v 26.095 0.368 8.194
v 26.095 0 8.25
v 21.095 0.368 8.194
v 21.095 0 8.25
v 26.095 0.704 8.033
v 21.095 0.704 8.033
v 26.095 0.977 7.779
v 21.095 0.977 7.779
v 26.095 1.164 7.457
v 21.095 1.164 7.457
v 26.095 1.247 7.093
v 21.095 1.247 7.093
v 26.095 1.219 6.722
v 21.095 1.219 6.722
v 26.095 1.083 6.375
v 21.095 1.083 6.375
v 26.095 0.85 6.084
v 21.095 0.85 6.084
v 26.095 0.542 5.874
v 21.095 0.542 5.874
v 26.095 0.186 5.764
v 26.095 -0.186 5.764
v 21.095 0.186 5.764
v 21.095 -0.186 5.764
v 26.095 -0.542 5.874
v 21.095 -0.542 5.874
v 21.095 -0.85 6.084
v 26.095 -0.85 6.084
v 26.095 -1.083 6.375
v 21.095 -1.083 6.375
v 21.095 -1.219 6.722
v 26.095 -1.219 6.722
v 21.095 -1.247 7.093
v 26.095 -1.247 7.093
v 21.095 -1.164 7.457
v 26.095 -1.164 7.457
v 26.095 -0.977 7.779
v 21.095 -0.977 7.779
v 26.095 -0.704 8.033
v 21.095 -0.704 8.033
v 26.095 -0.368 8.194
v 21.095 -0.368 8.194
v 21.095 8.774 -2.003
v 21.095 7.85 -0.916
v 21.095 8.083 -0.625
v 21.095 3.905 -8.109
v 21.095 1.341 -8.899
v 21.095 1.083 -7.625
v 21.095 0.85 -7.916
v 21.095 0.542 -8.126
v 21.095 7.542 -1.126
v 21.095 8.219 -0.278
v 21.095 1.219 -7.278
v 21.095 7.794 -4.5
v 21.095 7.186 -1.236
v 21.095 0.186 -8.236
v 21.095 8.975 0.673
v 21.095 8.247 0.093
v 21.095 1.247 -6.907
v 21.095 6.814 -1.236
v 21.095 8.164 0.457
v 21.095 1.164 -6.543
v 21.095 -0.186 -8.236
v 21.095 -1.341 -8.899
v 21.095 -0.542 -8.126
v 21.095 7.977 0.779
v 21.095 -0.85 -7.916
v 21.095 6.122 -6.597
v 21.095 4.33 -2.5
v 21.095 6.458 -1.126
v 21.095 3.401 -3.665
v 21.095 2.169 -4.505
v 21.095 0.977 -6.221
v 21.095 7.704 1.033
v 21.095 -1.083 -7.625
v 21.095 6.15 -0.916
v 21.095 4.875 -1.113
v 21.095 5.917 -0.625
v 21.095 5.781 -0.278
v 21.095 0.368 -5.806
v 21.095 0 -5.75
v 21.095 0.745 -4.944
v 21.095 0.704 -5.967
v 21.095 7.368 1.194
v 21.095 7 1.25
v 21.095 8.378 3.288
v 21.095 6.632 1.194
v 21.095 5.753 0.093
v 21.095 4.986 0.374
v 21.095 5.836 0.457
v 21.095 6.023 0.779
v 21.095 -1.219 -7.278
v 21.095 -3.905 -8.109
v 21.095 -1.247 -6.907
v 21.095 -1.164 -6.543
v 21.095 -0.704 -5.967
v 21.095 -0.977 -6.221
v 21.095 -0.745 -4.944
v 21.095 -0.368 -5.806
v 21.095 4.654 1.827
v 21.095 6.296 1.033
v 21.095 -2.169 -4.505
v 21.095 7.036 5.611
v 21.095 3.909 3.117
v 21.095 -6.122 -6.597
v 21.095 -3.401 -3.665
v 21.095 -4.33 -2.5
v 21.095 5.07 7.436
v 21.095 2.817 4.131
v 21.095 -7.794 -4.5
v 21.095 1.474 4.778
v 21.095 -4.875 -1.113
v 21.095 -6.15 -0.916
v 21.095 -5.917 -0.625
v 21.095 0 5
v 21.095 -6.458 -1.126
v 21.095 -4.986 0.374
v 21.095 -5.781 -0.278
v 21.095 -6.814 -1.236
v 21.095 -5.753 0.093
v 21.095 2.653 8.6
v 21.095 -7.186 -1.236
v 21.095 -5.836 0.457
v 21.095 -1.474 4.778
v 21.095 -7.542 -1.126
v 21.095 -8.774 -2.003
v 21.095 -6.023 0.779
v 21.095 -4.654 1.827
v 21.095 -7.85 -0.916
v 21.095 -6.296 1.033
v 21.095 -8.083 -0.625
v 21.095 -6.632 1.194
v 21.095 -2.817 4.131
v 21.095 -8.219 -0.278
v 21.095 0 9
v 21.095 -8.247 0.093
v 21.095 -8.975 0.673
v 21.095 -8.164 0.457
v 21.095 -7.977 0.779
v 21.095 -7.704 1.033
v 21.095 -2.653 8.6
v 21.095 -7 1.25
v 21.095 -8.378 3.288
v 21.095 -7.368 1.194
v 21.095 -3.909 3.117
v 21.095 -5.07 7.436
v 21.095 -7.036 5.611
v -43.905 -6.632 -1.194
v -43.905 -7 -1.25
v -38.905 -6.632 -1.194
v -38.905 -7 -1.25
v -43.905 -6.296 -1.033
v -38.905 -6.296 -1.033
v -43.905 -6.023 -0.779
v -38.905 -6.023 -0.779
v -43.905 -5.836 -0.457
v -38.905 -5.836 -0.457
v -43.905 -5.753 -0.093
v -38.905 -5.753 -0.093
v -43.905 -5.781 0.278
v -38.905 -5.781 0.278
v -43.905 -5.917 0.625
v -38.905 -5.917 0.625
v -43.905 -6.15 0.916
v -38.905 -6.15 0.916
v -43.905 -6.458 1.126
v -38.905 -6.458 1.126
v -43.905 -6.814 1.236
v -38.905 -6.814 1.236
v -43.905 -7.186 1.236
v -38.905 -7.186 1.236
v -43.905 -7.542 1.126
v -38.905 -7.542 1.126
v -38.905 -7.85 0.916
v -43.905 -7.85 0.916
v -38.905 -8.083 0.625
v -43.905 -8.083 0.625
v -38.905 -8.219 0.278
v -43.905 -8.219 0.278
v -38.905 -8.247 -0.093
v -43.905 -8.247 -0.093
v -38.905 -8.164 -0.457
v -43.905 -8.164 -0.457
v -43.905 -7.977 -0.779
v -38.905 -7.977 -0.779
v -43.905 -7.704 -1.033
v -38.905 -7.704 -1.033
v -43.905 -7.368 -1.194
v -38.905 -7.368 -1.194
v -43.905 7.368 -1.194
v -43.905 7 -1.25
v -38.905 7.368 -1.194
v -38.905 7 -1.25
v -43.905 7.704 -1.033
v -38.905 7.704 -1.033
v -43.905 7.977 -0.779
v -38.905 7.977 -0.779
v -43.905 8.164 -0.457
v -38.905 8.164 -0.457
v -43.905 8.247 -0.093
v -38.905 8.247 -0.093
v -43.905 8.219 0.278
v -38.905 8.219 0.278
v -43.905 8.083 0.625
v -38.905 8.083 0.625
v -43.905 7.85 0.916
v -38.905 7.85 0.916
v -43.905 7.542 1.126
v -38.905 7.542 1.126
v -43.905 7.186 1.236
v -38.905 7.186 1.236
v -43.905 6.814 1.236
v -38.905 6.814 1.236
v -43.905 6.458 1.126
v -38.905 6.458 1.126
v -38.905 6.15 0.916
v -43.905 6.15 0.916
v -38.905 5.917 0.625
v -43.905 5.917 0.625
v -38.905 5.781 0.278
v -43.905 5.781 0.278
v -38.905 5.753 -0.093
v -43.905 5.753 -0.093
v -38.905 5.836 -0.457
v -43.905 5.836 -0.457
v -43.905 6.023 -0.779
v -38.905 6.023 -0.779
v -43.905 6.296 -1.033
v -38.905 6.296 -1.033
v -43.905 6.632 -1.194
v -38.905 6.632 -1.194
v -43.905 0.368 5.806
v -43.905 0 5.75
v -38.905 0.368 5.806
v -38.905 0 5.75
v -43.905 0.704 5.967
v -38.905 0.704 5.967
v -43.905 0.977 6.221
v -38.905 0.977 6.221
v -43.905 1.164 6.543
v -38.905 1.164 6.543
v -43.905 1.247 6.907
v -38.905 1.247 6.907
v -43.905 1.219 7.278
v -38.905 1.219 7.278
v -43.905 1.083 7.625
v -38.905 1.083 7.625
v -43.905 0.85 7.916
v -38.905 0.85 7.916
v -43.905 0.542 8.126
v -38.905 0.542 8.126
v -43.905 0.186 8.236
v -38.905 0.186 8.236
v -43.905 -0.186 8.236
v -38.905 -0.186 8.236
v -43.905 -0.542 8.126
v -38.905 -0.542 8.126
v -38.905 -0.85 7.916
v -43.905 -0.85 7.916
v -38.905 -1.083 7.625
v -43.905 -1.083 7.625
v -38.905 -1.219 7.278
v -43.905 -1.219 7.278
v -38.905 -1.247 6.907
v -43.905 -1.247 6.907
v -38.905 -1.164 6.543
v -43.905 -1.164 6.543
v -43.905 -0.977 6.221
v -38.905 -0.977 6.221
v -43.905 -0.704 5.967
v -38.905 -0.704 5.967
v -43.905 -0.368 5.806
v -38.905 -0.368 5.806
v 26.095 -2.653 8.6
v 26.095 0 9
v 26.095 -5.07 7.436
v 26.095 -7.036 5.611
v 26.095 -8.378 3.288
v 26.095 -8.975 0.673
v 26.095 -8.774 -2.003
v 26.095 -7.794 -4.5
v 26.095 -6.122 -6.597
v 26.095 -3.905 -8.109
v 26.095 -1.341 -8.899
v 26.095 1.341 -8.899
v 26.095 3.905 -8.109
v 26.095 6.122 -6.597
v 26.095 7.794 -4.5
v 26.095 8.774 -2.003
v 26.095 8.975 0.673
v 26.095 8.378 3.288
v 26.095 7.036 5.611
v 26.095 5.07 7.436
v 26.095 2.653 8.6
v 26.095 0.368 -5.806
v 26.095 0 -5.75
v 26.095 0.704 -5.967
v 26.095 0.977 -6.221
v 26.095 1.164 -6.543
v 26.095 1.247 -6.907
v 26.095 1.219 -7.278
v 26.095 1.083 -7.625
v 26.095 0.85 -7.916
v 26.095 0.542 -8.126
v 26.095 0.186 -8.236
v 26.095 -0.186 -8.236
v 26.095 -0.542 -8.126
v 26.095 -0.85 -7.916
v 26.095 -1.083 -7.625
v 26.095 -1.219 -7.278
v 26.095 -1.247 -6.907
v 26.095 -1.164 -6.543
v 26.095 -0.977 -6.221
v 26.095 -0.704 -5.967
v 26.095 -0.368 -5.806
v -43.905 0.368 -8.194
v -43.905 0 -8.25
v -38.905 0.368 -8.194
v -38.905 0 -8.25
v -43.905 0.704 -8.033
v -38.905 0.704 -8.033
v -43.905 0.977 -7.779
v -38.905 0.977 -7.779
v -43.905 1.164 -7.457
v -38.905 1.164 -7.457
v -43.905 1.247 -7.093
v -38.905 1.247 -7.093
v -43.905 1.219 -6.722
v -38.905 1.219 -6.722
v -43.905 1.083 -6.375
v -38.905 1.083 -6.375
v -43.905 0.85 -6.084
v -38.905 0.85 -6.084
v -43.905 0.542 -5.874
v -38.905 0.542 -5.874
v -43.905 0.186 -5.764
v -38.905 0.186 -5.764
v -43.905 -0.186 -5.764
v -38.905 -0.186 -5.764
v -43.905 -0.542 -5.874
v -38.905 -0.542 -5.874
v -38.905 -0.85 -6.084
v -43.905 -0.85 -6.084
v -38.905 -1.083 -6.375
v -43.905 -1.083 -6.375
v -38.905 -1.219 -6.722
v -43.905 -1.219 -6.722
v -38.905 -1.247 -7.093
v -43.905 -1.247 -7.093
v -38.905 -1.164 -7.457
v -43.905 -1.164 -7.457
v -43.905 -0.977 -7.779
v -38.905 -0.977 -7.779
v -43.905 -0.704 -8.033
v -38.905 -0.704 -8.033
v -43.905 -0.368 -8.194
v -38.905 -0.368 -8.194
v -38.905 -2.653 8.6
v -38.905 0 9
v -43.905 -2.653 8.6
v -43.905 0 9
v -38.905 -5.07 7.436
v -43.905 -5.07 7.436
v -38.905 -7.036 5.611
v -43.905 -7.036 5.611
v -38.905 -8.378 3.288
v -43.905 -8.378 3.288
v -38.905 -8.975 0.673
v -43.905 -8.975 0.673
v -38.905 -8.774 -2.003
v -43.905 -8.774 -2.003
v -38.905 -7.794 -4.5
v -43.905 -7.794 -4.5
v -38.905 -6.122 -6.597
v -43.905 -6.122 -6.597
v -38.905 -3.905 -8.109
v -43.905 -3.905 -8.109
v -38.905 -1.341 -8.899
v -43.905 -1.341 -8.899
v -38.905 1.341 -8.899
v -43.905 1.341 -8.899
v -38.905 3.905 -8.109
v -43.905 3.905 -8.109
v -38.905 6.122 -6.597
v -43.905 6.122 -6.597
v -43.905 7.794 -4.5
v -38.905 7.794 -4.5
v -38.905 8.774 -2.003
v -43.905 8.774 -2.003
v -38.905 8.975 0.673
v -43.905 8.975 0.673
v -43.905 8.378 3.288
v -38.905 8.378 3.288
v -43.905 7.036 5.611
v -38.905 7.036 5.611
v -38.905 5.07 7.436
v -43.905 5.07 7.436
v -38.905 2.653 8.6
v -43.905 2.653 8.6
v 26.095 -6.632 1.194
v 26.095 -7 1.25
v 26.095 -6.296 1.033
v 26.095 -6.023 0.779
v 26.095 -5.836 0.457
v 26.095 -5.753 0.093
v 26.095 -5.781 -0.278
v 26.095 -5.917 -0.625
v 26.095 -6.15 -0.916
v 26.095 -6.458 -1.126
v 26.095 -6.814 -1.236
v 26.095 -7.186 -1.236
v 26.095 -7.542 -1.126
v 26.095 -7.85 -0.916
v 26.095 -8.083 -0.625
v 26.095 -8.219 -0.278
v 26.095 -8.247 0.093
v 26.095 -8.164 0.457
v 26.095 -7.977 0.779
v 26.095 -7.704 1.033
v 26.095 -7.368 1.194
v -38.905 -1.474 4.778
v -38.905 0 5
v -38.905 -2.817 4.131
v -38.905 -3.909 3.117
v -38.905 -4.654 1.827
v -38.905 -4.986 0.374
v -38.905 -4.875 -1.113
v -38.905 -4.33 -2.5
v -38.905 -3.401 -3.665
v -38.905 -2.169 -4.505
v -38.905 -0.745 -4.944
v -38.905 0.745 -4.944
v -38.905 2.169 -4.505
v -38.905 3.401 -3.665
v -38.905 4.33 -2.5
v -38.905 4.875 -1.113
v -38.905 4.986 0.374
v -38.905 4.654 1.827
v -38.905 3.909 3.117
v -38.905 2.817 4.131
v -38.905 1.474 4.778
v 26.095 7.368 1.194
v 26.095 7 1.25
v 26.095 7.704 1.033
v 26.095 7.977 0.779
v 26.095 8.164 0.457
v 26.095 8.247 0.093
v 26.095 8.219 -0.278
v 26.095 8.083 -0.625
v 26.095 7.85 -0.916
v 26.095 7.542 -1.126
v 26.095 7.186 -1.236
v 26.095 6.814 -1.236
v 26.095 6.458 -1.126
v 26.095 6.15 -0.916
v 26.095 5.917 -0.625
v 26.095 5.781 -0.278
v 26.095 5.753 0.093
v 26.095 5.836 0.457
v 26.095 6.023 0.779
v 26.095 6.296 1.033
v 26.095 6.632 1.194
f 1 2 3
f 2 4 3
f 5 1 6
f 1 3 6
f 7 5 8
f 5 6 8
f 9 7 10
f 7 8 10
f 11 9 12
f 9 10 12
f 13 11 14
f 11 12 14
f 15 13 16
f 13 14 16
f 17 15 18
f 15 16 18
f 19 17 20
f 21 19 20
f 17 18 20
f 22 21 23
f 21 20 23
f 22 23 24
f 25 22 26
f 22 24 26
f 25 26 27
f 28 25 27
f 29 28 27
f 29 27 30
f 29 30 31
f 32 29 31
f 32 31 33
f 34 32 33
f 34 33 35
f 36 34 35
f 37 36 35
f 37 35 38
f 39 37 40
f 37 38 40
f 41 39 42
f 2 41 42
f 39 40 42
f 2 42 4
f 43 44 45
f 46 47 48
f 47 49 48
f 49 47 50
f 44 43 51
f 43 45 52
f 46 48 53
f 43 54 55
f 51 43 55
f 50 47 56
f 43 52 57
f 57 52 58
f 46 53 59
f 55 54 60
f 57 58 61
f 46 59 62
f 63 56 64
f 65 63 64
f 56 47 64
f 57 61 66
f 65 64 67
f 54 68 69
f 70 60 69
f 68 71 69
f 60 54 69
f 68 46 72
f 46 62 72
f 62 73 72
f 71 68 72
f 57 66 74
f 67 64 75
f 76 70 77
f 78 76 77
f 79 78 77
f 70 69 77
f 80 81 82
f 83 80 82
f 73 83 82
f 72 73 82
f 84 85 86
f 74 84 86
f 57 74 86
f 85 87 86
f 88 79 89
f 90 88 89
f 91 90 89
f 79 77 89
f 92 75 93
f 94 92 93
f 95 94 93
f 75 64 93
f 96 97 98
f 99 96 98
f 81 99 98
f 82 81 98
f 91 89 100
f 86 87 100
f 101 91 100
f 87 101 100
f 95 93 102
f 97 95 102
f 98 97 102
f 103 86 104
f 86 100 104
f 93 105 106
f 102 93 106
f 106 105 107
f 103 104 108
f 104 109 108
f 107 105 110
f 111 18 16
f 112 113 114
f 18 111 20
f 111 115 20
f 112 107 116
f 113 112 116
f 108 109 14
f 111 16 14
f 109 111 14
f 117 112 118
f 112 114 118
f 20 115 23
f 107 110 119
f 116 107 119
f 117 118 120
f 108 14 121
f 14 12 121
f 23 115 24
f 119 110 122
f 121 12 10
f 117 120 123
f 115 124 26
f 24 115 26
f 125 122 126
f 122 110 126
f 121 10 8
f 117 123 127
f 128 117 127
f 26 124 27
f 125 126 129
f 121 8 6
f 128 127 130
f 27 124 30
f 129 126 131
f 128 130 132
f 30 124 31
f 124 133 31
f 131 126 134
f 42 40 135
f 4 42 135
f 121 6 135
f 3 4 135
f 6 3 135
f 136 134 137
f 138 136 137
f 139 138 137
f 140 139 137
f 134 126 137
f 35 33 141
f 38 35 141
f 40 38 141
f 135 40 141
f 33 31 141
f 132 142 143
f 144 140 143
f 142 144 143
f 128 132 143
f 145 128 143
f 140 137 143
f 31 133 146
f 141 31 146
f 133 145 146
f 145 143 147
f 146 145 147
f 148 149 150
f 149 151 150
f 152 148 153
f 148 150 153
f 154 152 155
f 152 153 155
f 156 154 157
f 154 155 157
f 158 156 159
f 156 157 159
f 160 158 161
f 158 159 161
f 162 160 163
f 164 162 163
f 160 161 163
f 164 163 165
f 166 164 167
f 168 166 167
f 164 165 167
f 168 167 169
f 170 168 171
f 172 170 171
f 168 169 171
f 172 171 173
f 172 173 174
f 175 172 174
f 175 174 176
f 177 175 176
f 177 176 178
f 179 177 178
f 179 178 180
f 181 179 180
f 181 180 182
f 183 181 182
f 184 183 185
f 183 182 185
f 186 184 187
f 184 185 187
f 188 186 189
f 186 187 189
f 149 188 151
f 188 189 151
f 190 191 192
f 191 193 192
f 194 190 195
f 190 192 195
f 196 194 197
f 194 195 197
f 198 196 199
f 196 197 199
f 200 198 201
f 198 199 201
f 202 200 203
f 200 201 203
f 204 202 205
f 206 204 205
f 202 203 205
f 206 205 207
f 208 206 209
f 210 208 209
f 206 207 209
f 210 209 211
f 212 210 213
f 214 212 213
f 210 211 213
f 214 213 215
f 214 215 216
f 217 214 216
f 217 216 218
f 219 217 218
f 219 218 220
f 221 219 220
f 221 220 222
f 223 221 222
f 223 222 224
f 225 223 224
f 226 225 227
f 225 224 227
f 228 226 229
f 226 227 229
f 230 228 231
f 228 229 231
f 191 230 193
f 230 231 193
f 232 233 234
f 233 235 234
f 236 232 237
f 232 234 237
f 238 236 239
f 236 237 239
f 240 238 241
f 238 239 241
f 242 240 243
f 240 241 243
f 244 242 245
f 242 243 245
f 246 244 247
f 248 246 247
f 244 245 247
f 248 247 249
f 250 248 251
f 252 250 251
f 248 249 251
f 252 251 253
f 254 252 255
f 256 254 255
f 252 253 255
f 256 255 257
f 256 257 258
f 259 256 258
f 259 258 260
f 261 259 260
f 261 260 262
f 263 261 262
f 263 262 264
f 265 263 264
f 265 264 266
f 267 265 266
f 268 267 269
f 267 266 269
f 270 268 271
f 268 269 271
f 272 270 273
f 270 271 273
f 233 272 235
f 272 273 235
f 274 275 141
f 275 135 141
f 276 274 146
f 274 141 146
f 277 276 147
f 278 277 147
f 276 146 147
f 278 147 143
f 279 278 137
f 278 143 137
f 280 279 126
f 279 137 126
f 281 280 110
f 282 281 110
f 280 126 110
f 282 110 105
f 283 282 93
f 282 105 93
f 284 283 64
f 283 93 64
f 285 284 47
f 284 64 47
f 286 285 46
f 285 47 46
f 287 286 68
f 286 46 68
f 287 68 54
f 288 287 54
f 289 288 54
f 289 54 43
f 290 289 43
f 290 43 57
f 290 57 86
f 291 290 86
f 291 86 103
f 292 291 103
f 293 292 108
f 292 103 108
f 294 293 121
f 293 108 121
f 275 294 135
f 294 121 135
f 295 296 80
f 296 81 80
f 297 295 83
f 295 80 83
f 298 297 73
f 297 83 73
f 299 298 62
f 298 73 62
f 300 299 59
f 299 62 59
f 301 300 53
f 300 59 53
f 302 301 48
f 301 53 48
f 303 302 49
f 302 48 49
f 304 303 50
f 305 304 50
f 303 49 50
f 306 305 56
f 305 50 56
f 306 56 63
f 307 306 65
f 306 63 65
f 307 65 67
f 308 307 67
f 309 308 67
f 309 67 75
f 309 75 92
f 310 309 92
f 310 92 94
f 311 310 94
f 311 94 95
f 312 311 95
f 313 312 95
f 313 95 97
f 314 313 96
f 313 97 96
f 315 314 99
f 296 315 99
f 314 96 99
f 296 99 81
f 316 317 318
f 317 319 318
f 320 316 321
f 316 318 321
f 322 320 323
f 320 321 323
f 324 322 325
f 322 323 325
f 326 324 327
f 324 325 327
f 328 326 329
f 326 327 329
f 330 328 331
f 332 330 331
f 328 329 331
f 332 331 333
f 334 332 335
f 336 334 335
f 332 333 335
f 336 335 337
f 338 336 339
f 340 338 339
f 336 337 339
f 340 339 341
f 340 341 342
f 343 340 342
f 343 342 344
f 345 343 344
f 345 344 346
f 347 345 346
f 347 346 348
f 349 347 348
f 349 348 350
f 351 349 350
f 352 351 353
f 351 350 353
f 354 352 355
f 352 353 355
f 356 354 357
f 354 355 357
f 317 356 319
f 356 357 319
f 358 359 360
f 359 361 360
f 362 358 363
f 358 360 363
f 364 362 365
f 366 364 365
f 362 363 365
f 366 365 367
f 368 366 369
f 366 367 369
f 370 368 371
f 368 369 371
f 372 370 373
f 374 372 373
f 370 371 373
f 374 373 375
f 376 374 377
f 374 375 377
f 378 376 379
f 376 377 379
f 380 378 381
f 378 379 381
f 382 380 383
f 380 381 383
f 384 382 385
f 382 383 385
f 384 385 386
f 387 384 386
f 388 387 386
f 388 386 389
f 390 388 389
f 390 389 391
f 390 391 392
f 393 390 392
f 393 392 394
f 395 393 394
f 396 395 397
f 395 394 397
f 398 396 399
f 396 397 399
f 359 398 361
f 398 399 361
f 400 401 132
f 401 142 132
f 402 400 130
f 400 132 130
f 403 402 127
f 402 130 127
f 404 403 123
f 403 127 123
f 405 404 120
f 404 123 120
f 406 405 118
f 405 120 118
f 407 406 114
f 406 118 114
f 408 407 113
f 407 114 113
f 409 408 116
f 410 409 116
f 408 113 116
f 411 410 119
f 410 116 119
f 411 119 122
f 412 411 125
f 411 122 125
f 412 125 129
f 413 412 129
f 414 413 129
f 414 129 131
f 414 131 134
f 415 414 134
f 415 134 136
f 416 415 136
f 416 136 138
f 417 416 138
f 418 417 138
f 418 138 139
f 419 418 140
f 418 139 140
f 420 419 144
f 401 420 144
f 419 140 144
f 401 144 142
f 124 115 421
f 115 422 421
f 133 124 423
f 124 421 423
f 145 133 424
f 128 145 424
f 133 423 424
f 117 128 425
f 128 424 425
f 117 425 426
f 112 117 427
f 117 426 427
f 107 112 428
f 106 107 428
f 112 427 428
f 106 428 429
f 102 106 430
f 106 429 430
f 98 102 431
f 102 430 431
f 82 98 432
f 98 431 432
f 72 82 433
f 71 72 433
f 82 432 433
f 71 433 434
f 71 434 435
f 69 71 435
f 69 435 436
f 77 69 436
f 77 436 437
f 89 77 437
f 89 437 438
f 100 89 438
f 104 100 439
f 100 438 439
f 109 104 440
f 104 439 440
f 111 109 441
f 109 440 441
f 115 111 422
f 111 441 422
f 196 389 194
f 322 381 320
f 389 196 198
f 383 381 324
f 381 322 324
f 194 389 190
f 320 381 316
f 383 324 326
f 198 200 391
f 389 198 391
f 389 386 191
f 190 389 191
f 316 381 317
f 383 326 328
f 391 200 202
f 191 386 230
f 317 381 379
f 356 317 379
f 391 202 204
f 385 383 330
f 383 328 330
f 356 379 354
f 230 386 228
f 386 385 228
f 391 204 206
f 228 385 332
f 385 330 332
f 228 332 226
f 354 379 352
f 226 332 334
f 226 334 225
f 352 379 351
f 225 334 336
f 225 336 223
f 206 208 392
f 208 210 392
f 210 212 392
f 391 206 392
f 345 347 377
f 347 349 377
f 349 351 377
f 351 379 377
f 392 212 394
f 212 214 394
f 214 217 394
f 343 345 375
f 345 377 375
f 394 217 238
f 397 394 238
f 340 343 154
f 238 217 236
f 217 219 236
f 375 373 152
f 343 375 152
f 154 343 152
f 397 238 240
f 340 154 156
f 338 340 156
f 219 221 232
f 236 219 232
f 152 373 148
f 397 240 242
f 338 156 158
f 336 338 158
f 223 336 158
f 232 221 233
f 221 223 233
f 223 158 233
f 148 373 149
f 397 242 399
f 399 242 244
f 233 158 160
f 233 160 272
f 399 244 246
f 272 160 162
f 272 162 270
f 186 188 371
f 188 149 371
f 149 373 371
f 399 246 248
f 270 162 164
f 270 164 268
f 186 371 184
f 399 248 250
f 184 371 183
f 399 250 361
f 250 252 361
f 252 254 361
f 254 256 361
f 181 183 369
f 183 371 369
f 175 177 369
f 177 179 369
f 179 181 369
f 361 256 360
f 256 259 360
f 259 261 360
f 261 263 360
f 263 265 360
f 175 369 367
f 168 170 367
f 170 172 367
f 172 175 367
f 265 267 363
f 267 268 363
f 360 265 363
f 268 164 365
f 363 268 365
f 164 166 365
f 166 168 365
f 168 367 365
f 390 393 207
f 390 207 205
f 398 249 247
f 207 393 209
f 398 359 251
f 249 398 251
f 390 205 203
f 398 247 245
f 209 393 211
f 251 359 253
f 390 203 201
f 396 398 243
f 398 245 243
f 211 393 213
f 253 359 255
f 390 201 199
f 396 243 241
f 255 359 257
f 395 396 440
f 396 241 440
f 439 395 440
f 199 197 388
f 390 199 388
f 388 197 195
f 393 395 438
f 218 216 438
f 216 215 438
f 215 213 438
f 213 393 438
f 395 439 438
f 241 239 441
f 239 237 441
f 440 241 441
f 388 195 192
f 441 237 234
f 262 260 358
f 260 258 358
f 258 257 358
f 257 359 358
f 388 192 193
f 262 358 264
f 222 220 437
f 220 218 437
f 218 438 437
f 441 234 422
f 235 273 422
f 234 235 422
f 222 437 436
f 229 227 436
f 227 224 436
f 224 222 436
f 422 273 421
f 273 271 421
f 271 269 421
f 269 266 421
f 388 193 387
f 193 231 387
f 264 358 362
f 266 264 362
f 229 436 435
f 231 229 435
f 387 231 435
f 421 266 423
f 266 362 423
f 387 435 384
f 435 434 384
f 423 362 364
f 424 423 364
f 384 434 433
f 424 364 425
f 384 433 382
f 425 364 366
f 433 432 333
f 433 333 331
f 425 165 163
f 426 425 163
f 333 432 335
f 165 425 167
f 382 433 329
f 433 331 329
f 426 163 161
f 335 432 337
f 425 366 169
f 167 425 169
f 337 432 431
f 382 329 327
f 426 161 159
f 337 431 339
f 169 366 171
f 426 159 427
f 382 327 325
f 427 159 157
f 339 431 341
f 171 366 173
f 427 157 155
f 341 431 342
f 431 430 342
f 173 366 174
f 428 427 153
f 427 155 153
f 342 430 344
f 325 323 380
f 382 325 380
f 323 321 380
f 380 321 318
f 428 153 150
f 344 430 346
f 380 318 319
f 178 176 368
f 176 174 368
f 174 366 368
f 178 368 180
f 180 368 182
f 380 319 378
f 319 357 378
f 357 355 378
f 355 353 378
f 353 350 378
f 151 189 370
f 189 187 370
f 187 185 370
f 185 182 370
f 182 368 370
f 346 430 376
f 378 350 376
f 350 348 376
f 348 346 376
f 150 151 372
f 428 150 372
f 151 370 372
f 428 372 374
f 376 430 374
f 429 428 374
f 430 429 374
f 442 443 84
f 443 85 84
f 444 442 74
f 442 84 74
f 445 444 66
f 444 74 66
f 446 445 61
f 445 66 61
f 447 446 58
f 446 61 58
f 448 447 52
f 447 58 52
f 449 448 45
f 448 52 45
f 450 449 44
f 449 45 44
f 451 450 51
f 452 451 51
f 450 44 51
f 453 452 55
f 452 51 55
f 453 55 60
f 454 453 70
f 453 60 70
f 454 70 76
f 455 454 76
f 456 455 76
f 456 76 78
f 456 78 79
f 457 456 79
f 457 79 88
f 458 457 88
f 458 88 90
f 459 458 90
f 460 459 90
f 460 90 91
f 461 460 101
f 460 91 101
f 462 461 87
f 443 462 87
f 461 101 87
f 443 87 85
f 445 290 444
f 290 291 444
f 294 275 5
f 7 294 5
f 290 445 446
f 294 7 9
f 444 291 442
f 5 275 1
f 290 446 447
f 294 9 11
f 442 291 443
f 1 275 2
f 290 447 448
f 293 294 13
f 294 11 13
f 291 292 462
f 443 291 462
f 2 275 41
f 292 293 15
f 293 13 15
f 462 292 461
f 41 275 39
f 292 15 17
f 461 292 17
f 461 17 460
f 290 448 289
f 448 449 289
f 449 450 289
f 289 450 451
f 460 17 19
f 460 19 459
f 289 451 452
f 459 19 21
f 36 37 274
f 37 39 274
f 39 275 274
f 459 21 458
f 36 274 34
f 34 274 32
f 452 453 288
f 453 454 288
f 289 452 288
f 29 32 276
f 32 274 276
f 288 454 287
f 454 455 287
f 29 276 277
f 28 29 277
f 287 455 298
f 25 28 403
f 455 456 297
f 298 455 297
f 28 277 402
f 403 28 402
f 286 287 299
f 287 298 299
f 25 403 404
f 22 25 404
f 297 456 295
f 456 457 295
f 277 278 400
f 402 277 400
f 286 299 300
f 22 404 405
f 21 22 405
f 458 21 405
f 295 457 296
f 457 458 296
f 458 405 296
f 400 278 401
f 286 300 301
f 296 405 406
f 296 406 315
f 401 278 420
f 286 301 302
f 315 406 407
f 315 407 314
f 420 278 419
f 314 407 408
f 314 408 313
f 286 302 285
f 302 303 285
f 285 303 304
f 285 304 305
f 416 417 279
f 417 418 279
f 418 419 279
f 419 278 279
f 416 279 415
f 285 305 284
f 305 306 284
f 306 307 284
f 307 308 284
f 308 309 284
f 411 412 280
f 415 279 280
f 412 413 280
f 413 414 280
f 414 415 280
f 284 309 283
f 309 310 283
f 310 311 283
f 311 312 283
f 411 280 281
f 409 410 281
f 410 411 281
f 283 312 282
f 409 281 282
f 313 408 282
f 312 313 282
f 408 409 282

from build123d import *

# Parameters (mm, degrees)
HOLE_WIZARD_M3_1_D     = 2.5
HOLE_WIZARD_M3_1_DEPTH = 5
HOLE_WIZARD_M3_1_TIP   = 0.751075774
HOLE_WIZARD_M3_2_D     = 2.5
HOLE_WIZARD_M3_2_DEPTH = 5
HOLE_WIZARD_M3_2_TIP   = 0.751075774


with BuildPart() as part:
    # 草图1 → 旋转1 (revolve)
    with BuildSketch(Plane.XY, mode=Mode.PRIVATE) as revolve_1_sk:
        Polygon((-43.905067628, 0), (26.094932372, 0), (26.094932372, 9), (21.094932372, 9), (21.094932372, 5), (-38.905067628, 5), (-38.905067628, 9), (-43.905067628, 9), align=None)
    revolve(revolve_1_sk.sketch.rotate(Axis((-43.905067628, 0, 0), (1, 0, 0)), 90), axis=Axis((-43.905067628, 0, 0), (1, 0, 0)))

    # M3 螺纹孔1
    with Locations(Plane.ZY.offset(43.905067628)):
        with Locations((7, 0), (0, 7), (-7, 0), (0, -7)):
            Hole(HOLE_WIZARD_M3_1_D / 2, depth=HOLE_WIZARD_M3_1_DEPTH)
            with Locations((0, 0, -(HOLE_WIZARD_M3_1_DEPTH + HOLE_WIZARD_M3_1_TIP / 2))):  # 118° drill point
                Cone(0, HOLE_WIZARD_M3_1_D / 2, HOLE_WIZARD_M3_1_TIP, mode=Mode.SUBTRACT)

    # M3 螺纹孔2
    with Locations(Plane(origin=(26.094932372, 0, 0), x_dir=(0, 0, -1), z_dir=(1, 0, 0))):
        with Locations((0, -7), (7, 0), (0, 7), (-7, 0)):
            Hole(HOLE_WIZARD_M3_2_D / 2, depth=HOLE_WIZARD_M3_2_DEPTH)
            with Locations((0, 0, -(HOLE_WIZARD_M3_2_DEPTH + HOLE_WIZARD_M3_2_TIP / 2))):  # 118° drill point
                Cone(0, HOLE_WIZARD_M3_2_D / 2, HOLE_WIZARD_M3_2_TIP, mode=Mode.SUBTRACT)


solid = part.part
